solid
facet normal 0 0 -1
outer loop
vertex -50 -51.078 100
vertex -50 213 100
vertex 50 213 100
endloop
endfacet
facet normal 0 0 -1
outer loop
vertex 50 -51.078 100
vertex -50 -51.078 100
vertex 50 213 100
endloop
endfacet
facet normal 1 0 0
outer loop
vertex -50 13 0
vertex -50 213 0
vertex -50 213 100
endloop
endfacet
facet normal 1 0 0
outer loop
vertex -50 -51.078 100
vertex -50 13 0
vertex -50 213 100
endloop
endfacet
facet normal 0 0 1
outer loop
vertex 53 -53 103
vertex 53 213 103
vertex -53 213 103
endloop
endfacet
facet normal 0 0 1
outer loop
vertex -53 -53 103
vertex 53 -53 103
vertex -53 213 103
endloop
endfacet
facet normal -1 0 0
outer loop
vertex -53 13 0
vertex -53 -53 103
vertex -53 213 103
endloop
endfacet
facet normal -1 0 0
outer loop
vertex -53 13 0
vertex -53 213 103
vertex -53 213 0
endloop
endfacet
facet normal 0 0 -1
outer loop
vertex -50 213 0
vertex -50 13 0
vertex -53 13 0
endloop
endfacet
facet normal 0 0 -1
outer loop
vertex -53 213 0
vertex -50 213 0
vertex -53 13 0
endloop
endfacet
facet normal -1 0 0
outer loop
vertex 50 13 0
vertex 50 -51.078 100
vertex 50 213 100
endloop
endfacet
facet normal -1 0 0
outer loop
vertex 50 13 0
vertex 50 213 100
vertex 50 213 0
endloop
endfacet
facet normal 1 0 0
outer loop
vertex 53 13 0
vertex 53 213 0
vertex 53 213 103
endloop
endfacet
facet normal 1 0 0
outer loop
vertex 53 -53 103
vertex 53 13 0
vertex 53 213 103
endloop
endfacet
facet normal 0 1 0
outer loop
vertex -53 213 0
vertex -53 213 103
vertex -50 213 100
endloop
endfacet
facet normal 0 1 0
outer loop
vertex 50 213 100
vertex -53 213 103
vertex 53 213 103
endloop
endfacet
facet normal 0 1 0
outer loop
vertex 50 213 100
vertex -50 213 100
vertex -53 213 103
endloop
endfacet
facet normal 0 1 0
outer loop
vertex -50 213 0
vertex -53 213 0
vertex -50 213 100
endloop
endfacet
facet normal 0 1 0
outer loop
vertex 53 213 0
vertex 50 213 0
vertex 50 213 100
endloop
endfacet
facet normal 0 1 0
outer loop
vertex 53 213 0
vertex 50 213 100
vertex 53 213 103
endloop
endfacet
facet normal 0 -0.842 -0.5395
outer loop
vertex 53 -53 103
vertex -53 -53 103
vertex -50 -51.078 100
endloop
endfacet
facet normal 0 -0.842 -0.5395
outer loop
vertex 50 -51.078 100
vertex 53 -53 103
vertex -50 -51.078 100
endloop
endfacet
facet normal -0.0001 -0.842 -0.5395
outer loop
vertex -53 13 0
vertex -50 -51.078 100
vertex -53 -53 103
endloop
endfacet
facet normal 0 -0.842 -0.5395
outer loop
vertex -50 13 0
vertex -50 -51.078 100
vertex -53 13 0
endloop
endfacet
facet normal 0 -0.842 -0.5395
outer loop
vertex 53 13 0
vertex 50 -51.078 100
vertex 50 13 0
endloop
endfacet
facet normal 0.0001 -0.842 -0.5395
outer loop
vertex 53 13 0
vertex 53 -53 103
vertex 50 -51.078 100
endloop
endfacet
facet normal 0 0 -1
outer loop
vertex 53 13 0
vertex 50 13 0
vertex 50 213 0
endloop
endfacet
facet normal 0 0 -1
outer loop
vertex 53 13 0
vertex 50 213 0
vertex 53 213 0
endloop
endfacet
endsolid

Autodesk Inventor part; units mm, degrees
ref_plane "YZ Plane" through (0, 0, 0) normal (1, 0, 0) x (0, 1, 0)
ref_plane "XZ Plane" through (0, 0, 0) normal (0, 1, 0) x (-1, 0, 0)
ref_plane "XY Plane" through (0, 0, 0) normal (0, 0, 1) x (1, 0, 0)
sketch "Sketch2" plane through (0, 0, 0) normal (0, 0, 1) x (1, 0, 0)
  line L0 (53, 53) -> (-53, 53)
  line L1 (-53, 53) -> (-53, -53)
  line L2 (-53, -53) -> (53, -53)
  line L3 (53, -53) -> (53, 53)
  line L4 (53, 53) -> (-53, -53) construction
  line L5 (-53, 53) -> (53, -53) construction
  point P0 (0, 0)
  dimension "d0" = 106
  dimension "d1" = 106
extrude "Extrusion1" add sketch "Sketch2" along normal blind 103
sketch "Sketch3" plane through (-53, -53, 0) normal (0, -1, 0) x (1, 0, 0)
  line L0 (0, 0) -> (106, 0) construction
  line L1 (106, 0) -> (106, 103) construction
  line L2 (0, 103) -> (106, 103) construction
  line L3 (0, 0) -> (0, 103) construction
  line L4 (103, 0) -> (3, 0)
  line L5 (3, 0) -> (3, 100)
  line L6 (3, 100) -> (103, 100)
  line L7 (103, 100) -> (103, 0)
  line L8 (103, 0) -> (3, 100) construction
  line L9 (3, 0) -> (103, 100) construction
  line L10 (53, 127.2) -> (53, -21.2) construction
  point P0 (53, 0)
  point P1 (53, 50)
  point P2 (53, 50)
  point P3 (53, 0)
  dimension "d4" = 3
  dimension "d5" = 3
extrude "Extrusion2" cut sketch "Sketch3" against normal up to surface (106 mm away)
sketch "Sketch4" plane through (53, -53, 0) normal (1, 0, 0) x (0, 0, -1)
  line L0 (0, 0) -> (0, 106) construction
  line L1 (0, 106) -> (-103, 106) construction
  line L2 (-103, 0) -> (-103, 106) construction
  line L3 (0, 0) -> (-103, 0) construction
  line L4 (0, 0) -> (-103, 0)
  line L5 (-103, 0) -> (0, 66)
  line L6 (0, 0) -> (0, 66)
  point P0 (0, 53)
  dimension "d14" = 40
extrude "Extrusion3" cut sketch "Sketch4" against normal up to surface (106 mm away)
sketch "Sketch5" plane through (-53, 53, 103) normal (0, 1, 0) x (1, 0, 0)
  line L0 (3, 3) -> (3, 103) construction
  line L1 (0, 103) -> (0, 0) construction
  line L2 (106, 0) -> (0, 0) construction
  line L3 (106, 103) -> (106, 0) construction
  line L4 (103, 103) -> (103, 3) construction
  line L5 (103, 3) -> (3, 3) construction
  line L6 (103, 103) -> (106, 103)
  line L7 (106, 103) -> (106, 0)
  line L8 (0, 0) -> (0, 103)
  line L9 (3, 103) -> (0, 103)
  line L10 (3, 103) -> (3, 3)
  line L11 (3, 3) -> (103, 3)
  line L12 (103, 3) -> (103, 103)
  line L13 (106, 0) -> (0, 0)
  line L14 (127.2, 103) -> (-21.2, 103) construction
  line L15 (3, 103) -> (0, 103) projected
  line L16 (106, 103) -> (103, 103) projected
  point P0 (53, 103)
  point P1 (1.5, 103)
extrude "Extrusion4" add sketch "Sketch5" along normal blind 160
properties part number "P034_Casquette"
